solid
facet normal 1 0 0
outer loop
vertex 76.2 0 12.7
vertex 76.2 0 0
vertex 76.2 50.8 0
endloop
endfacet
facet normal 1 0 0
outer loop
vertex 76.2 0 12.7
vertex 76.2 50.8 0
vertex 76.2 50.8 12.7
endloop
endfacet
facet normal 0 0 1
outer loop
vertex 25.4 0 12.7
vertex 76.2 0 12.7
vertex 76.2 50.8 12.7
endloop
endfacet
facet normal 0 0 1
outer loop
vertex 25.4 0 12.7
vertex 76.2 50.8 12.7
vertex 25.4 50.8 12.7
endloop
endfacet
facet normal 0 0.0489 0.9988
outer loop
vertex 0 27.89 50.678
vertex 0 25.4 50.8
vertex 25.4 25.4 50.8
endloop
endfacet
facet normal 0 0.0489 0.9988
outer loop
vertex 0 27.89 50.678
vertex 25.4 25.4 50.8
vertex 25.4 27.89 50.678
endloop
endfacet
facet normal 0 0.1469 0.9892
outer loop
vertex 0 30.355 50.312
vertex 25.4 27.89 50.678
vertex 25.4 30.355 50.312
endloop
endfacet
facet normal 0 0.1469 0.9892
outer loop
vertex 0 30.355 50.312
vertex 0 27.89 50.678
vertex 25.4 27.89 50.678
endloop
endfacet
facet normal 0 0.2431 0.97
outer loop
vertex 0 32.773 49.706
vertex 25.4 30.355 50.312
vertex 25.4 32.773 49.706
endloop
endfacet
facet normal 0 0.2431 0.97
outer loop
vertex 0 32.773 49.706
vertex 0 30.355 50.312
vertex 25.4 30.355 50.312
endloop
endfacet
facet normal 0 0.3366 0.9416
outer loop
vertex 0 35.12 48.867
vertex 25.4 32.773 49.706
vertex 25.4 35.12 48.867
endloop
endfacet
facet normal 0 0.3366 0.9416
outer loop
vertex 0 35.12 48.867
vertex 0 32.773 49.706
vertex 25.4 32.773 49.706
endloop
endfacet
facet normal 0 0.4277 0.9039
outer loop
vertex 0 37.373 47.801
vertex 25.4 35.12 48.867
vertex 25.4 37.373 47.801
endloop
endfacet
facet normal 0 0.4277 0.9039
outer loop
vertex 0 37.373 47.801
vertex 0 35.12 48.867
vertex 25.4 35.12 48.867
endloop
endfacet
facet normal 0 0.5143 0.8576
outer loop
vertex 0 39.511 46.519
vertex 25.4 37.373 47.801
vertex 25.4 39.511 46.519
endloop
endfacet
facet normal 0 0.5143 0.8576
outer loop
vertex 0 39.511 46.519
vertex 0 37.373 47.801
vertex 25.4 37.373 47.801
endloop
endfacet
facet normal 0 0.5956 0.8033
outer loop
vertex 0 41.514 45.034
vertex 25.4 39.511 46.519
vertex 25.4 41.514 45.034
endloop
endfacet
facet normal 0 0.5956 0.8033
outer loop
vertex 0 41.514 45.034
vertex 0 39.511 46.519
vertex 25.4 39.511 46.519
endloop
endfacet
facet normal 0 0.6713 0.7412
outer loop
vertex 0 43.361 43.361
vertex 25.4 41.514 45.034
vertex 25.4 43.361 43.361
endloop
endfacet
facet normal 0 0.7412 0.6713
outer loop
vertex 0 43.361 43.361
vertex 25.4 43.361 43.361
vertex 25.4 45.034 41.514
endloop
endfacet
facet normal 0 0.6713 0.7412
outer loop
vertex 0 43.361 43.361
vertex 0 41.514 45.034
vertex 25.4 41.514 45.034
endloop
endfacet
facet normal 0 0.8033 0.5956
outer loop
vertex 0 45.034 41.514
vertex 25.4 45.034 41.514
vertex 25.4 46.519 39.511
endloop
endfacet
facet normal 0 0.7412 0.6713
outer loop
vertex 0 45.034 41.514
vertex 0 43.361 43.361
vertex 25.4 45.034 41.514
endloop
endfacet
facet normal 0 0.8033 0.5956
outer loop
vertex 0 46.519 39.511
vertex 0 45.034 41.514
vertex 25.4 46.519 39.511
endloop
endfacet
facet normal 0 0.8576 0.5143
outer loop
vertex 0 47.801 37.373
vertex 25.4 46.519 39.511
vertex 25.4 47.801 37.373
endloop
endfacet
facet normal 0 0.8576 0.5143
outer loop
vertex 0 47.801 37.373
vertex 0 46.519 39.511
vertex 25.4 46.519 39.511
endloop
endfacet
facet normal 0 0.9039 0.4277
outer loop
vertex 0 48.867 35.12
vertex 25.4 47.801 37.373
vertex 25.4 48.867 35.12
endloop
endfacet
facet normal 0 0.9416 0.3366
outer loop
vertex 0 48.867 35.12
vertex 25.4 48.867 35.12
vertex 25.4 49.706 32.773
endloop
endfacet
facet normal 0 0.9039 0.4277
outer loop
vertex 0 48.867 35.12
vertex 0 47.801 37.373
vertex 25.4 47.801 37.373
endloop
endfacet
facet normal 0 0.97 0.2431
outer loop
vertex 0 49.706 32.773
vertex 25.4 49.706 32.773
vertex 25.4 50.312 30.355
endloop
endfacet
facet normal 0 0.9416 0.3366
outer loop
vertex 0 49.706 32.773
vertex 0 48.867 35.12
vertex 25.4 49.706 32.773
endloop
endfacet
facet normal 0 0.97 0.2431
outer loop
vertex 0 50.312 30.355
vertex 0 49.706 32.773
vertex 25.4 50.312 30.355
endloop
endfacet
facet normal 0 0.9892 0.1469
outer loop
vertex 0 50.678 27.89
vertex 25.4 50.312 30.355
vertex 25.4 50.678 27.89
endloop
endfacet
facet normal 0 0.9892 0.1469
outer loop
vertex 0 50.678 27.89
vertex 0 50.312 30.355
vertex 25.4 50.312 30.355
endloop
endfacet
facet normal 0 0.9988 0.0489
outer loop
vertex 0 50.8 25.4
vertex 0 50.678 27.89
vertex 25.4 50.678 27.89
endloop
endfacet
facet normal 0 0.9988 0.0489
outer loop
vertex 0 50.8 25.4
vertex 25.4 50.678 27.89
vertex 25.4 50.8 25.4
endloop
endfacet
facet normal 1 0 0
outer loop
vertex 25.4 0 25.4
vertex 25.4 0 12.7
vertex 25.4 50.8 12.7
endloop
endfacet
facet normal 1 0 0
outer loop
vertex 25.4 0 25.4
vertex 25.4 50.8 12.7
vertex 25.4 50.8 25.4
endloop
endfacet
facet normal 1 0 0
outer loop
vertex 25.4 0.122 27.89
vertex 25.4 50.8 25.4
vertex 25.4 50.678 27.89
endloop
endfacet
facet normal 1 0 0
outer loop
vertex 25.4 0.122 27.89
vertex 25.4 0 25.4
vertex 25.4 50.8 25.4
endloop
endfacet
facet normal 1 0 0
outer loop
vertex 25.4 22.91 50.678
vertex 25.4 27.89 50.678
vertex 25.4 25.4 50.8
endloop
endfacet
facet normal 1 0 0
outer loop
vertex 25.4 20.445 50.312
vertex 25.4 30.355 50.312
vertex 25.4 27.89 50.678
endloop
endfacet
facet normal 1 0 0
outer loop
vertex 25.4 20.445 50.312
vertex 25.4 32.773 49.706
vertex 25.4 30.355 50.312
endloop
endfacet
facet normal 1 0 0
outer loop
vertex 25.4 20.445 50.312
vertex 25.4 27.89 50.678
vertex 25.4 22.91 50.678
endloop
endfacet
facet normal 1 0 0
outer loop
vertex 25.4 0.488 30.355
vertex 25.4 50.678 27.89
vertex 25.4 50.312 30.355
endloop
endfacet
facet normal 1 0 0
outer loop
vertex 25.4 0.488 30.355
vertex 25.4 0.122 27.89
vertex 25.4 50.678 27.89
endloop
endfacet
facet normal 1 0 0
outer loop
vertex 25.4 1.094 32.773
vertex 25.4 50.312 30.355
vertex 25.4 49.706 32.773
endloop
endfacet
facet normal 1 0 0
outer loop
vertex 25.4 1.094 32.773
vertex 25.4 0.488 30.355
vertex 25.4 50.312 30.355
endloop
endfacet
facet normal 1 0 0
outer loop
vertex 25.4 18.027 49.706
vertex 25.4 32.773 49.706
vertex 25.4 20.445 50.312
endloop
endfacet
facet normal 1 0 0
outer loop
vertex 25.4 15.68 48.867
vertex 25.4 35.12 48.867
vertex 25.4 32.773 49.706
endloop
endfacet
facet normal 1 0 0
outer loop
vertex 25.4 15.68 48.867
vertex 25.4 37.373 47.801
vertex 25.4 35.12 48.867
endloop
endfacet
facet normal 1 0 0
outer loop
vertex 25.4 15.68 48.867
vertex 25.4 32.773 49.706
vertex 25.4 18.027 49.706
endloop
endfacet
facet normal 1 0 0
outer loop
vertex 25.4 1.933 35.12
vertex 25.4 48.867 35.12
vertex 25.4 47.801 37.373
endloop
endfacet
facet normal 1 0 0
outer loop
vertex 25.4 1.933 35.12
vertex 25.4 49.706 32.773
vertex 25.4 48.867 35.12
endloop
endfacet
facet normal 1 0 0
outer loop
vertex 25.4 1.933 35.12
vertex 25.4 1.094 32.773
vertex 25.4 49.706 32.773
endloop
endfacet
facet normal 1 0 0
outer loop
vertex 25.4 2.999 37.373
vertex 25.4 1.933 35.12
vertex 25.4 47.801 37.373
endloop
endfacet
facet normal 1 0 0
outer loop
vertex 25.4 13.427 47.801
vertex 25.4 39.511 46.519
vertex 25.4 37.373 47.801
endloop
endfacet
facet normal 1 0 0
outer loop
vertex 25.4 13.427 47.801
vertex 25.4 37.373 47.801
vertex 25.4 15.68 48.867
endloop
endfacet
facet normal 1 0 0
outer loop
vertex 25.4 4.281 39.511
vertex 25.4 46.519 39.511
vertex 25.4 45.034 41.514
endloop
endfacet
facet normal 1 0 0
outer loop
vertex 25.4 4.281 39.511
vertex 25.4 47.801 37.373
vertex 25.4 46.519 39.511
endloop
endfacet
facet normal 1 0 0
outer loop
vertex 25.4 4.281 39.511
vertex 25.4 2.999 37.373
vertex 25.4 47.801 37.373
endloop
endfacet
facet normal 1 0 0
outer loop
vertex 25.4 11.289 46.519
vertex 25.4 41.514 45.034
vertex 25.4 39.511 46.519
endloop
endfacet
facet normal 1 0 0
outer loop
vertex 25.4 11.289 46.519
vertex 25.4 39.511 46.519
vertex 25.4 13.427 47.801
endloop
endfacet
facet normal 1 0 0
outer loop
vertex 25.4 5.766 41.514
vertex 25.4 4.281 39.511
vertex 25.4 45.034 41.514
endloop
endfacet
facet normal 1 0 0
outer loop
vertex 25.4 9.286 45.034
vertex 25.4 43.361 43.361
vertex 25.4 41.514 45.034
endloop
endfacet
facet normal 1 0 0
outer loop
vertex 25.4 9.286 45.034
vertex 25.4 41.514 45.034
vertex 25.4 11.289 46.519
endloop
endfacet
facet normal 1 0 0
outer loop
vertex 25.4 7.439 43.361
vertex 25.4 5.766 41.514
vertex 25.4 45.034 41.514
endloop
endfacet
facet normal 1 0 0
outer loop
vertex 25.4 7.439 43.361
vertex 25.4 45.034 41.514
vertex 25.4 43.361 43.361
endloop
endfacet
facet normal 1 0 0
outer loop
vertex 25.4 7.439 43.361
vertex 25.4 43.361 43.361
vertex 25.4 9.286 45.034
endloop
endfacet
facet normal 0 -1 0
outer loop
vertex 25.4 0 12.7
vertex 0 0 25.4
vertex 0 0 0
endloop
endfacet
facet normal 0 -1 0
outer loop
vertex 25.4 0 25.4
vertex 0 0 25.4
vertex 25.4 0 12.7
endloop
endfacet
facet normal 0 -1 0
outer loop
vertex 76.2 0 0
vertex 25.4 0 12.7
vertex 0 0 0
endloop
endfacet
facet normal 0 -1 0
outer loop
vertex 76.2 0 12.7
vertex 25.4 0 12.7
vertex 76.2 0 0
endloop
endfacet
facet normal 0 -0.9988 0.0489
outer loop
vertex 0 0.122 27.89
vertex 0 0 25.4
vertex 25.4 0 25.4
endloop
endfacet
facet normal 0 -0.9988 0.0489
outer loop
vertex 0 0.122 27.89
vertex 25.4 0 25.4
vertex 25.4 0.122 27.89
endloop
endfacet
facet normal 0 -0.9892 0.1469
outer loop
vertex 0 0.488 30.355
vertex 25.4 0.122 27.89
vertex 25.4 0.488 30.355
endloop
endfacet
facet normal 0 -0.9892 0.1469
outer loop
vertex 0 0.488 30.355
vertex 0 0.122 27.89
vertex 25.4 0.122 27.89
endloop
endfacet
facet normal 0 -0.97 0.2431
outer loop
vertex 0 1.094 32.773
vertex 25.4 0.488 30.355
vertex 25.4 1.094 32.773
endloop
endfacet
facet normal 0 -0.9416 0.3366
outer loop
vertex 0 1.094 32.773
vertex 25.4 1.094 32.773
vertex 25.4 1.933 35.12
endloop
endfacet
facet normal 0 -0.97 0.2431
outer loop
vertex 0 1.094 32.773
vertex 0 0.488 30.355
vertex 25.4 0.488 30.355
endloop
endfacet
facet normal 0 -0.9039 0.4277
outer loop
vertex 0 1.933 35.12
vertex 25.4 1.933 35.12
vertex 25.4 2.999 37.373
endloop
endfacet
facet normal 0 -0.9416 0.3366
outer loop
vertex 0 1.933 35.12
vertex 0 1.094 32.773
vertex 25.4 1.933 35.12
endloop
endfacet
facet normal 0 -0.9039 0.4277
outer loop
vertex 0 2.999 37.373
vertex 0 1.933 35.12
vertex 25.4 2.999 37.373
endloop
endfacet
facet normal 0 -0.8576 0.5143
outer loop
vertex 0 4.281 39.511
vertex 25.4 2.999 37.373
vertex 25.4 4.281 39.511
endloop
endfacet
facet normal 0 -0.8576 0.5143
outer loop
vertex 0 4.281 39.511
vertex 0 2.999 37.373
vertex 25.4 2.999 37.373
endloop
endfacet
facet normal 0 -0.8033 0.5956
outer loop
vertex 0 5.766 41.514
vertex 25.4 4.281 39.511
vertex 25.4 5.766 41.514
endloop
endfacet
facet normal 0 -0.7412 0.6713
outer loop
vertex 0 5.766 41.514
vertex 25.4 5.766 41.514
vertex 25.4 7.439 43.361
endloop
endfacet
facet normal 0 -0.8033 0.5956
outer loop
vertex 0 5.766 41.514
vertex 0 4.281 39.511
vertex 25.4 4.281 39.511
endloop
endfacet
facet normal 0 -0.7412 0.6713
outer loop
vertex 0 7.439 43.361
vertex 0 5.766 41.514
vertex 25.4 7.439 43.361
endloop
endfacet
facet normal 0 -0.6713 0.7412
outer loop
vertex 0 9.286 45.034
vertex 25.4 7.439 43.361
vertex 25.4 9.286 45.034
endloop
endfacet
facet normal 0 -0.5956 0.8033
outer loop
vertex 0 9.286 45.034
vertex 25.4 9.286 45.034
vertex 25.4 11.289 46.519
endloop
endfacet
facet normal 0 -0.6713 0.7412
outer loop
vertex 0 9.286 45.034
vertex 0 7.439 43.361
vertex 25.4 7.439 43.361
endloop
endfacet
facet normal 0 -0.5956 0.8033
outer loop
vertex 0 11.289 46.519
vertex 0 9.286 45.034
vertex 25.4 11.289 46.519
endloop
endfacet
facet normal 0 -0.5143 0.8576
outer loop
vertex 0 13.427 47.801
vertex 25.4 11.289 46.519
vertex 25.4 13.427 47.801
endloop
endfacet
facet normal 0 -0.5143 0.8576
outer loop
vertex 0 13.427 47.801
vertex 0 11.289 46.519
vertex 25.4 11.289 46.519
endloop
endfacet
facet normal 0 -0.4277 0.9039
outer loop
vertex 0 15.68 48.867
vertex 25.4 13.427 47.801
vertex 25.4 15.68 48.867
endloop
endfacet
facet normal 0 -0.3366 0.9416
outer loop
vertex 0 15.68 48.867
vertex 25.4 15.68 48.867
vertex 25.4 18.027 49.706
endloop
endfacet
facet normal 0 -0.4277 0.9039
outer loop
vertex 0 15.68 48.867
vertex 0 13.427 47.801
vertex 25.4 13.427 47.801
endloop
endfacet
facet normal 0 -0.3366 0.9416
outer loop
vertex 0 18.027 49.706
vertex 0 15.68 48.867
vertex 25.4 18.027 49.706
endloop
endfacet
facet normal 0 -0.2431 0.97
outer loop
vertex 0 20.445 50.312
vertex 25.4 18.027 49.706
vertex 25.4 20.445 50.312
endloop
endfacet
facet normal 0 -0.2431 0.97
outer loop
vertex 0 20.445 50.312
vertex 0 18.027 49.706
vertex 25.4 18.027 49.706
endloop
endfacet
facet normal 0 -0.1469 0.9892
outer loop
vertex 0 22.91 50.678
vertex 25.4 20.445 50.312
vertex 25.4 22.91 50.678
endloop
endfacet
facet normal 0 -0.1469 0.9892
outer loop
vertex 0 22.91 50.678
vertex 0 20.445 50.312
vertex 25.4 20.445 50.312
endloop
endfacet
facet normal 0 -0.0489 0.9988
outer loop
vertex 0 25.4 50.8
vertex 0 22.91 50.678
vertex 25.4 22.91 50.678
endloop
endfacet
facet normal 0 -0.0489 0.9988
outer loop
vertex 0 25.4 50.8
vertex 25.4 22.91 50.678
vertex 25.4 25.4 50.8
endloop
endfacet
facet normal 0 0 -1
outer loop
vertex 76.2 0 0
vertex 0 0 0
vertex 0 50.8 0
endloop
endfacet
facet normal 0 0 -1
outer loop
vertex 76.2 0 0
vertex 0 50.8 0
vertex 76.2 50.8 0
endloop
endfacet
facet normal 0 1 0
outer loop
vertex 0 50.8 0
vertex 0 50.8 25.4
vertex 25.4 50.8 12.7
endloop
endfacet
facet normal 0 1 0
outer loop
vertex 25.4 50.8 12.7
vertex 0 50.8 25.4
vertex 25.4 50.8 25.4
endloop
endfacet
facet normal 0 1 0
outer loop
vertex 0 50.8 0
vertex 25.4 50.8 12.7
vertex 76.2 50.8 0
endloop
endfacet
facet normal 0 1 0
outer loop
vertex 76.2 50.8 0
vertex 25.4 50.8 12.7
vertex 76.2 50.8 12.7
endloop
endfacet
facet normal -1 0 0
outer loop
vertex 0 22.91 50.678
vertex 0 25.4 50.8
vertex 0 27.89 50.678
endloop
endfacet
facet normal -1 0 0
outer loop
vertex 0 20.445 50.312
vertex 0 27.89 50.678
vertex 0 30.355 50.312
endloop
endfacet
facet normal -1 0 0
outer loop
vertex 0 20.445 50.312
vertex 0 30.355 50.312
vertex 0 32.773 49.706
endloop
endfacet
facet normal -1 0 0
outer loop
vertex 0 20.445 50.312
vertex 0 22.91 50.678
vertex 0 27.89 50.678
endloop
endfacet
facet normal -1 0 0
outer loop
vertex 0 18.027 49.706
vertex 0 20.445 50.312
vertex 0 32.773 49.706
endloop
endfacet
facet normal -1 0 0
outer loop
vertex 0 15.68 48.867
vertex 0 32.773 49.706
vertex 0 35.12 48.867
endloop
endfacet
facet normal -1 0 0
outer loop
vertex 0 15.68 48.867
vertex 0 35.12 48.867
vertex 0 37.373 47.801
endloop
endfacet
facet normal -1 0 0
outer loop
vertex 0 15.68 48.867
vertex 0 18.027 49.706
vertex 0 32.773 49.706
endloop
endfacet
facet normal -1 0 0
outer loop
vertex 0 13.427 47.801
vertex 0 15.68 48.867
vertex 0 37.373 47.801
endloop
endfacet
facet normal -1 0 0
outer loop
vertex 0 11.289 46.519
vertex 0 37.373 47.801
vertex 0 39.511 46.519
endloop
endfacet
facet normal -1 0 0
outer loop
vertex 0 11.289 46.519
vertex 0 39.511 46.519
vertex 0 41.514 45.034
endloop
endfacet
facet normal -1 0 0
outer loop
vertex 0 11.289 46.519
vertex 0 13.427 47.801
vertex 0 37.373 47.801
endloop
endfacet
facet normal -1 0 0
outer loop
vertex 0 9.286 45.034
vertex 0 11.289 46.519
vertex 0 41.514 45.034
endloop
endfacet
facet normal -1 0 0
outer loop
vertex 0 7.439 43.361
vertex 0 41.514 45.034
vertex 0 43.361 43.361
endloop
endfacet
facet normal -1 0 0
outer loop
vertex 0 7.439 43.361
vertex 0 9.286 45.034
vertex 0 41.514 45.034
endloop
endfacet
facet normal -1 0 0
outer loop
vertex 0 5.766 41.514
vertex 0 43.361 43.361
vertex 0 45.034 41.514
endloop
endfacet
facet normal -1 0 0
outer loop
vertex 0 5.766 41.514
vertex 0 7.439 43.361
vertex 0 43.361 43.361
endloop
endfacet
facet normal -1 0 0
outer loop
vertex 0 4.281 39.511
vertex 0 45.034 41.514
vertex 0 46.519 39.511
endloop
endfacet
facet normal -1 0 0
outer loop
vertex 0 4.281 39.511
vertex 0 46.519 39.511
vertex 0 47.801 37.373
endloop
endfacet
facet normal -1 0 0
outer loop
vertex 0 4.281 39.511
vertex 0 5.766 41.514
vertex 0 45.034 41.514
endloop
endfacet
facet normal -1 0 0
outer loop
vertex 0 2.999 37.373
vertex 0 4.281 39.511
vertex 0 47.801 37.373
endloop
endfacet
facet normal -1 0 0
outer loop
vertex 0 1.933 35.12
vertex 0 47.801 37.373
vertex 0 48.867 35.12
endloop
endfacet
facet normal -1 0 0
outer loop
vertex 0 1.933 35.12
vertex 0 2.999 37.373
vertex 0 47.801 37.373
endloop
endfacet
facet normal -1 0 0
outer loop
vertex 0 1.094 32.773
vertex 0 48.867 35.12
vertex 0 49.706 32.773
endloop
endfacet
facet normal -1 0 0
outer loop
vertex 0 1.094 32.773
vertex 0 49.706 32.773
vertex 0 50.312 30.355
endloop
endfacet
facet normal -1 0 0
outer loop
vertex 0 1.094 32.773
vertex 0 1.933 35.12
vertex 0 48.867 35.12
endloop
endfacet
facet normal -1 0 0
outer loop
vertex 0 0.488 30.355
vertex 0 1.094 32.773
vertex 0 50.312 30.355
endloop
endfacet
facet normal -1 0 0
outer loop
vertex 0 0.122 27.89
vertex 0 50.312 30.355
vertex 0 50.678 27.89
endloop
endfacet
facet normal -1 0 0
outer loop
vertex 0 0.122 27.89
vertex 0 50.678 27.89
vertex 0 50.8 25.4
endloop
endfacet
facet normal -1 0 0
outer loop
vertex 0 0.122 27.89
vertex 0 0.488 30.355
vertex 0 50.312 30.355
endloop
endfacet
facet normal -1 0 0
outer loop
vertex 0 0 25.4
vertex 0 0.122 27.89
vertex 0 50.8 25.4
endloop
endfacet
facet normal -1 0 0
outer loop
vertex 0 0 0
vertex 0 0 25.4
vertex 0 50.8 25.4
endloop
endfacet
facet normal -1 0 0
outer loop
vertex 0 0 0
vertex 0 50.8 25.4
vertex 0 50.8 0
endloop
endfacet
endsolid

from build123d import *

# Parameters (mm, degrees)
F2_DEPTH = 50.8
F3_DEPTH = 25.4


with BuildPart() as f2:
    # F0 (on Front) → F2 (new body)
    with BuildSketch(Plane.XZ):
        Polygon((0, 50.8), (0, 0), (76.2, 0), (76.2, 12.7), (25.4, 12.7), (25.4, 50.8), align=None)
    extrude(amount=-F2_DEPTH)

    # F1 (on Right) → F3 (cut)
    with BuildSketch(Plane.YZ):
        with BuildLine():
            Line((50.8, 50.8), (25.4, 50.8))
            ThreePointArc((25.4, 50.8), (43.360512, 43.360512), (50.8, 25.4))
            Line((50.8, 25.4), (50.8, 50.8))
        make_face()
        with BuildLine():
            ThreePointArc((0, 25.4), (7.439488, 43.360512), (25.4, 50.8))
            Line((25.4, 50.8), (0, 50.8))
            Line((0, 50.8), (0, 25.4))
        make_face()
    extrude(amount=F3_DEPTH, mode=Mode.SUBTRACT)


solid = f2.part
